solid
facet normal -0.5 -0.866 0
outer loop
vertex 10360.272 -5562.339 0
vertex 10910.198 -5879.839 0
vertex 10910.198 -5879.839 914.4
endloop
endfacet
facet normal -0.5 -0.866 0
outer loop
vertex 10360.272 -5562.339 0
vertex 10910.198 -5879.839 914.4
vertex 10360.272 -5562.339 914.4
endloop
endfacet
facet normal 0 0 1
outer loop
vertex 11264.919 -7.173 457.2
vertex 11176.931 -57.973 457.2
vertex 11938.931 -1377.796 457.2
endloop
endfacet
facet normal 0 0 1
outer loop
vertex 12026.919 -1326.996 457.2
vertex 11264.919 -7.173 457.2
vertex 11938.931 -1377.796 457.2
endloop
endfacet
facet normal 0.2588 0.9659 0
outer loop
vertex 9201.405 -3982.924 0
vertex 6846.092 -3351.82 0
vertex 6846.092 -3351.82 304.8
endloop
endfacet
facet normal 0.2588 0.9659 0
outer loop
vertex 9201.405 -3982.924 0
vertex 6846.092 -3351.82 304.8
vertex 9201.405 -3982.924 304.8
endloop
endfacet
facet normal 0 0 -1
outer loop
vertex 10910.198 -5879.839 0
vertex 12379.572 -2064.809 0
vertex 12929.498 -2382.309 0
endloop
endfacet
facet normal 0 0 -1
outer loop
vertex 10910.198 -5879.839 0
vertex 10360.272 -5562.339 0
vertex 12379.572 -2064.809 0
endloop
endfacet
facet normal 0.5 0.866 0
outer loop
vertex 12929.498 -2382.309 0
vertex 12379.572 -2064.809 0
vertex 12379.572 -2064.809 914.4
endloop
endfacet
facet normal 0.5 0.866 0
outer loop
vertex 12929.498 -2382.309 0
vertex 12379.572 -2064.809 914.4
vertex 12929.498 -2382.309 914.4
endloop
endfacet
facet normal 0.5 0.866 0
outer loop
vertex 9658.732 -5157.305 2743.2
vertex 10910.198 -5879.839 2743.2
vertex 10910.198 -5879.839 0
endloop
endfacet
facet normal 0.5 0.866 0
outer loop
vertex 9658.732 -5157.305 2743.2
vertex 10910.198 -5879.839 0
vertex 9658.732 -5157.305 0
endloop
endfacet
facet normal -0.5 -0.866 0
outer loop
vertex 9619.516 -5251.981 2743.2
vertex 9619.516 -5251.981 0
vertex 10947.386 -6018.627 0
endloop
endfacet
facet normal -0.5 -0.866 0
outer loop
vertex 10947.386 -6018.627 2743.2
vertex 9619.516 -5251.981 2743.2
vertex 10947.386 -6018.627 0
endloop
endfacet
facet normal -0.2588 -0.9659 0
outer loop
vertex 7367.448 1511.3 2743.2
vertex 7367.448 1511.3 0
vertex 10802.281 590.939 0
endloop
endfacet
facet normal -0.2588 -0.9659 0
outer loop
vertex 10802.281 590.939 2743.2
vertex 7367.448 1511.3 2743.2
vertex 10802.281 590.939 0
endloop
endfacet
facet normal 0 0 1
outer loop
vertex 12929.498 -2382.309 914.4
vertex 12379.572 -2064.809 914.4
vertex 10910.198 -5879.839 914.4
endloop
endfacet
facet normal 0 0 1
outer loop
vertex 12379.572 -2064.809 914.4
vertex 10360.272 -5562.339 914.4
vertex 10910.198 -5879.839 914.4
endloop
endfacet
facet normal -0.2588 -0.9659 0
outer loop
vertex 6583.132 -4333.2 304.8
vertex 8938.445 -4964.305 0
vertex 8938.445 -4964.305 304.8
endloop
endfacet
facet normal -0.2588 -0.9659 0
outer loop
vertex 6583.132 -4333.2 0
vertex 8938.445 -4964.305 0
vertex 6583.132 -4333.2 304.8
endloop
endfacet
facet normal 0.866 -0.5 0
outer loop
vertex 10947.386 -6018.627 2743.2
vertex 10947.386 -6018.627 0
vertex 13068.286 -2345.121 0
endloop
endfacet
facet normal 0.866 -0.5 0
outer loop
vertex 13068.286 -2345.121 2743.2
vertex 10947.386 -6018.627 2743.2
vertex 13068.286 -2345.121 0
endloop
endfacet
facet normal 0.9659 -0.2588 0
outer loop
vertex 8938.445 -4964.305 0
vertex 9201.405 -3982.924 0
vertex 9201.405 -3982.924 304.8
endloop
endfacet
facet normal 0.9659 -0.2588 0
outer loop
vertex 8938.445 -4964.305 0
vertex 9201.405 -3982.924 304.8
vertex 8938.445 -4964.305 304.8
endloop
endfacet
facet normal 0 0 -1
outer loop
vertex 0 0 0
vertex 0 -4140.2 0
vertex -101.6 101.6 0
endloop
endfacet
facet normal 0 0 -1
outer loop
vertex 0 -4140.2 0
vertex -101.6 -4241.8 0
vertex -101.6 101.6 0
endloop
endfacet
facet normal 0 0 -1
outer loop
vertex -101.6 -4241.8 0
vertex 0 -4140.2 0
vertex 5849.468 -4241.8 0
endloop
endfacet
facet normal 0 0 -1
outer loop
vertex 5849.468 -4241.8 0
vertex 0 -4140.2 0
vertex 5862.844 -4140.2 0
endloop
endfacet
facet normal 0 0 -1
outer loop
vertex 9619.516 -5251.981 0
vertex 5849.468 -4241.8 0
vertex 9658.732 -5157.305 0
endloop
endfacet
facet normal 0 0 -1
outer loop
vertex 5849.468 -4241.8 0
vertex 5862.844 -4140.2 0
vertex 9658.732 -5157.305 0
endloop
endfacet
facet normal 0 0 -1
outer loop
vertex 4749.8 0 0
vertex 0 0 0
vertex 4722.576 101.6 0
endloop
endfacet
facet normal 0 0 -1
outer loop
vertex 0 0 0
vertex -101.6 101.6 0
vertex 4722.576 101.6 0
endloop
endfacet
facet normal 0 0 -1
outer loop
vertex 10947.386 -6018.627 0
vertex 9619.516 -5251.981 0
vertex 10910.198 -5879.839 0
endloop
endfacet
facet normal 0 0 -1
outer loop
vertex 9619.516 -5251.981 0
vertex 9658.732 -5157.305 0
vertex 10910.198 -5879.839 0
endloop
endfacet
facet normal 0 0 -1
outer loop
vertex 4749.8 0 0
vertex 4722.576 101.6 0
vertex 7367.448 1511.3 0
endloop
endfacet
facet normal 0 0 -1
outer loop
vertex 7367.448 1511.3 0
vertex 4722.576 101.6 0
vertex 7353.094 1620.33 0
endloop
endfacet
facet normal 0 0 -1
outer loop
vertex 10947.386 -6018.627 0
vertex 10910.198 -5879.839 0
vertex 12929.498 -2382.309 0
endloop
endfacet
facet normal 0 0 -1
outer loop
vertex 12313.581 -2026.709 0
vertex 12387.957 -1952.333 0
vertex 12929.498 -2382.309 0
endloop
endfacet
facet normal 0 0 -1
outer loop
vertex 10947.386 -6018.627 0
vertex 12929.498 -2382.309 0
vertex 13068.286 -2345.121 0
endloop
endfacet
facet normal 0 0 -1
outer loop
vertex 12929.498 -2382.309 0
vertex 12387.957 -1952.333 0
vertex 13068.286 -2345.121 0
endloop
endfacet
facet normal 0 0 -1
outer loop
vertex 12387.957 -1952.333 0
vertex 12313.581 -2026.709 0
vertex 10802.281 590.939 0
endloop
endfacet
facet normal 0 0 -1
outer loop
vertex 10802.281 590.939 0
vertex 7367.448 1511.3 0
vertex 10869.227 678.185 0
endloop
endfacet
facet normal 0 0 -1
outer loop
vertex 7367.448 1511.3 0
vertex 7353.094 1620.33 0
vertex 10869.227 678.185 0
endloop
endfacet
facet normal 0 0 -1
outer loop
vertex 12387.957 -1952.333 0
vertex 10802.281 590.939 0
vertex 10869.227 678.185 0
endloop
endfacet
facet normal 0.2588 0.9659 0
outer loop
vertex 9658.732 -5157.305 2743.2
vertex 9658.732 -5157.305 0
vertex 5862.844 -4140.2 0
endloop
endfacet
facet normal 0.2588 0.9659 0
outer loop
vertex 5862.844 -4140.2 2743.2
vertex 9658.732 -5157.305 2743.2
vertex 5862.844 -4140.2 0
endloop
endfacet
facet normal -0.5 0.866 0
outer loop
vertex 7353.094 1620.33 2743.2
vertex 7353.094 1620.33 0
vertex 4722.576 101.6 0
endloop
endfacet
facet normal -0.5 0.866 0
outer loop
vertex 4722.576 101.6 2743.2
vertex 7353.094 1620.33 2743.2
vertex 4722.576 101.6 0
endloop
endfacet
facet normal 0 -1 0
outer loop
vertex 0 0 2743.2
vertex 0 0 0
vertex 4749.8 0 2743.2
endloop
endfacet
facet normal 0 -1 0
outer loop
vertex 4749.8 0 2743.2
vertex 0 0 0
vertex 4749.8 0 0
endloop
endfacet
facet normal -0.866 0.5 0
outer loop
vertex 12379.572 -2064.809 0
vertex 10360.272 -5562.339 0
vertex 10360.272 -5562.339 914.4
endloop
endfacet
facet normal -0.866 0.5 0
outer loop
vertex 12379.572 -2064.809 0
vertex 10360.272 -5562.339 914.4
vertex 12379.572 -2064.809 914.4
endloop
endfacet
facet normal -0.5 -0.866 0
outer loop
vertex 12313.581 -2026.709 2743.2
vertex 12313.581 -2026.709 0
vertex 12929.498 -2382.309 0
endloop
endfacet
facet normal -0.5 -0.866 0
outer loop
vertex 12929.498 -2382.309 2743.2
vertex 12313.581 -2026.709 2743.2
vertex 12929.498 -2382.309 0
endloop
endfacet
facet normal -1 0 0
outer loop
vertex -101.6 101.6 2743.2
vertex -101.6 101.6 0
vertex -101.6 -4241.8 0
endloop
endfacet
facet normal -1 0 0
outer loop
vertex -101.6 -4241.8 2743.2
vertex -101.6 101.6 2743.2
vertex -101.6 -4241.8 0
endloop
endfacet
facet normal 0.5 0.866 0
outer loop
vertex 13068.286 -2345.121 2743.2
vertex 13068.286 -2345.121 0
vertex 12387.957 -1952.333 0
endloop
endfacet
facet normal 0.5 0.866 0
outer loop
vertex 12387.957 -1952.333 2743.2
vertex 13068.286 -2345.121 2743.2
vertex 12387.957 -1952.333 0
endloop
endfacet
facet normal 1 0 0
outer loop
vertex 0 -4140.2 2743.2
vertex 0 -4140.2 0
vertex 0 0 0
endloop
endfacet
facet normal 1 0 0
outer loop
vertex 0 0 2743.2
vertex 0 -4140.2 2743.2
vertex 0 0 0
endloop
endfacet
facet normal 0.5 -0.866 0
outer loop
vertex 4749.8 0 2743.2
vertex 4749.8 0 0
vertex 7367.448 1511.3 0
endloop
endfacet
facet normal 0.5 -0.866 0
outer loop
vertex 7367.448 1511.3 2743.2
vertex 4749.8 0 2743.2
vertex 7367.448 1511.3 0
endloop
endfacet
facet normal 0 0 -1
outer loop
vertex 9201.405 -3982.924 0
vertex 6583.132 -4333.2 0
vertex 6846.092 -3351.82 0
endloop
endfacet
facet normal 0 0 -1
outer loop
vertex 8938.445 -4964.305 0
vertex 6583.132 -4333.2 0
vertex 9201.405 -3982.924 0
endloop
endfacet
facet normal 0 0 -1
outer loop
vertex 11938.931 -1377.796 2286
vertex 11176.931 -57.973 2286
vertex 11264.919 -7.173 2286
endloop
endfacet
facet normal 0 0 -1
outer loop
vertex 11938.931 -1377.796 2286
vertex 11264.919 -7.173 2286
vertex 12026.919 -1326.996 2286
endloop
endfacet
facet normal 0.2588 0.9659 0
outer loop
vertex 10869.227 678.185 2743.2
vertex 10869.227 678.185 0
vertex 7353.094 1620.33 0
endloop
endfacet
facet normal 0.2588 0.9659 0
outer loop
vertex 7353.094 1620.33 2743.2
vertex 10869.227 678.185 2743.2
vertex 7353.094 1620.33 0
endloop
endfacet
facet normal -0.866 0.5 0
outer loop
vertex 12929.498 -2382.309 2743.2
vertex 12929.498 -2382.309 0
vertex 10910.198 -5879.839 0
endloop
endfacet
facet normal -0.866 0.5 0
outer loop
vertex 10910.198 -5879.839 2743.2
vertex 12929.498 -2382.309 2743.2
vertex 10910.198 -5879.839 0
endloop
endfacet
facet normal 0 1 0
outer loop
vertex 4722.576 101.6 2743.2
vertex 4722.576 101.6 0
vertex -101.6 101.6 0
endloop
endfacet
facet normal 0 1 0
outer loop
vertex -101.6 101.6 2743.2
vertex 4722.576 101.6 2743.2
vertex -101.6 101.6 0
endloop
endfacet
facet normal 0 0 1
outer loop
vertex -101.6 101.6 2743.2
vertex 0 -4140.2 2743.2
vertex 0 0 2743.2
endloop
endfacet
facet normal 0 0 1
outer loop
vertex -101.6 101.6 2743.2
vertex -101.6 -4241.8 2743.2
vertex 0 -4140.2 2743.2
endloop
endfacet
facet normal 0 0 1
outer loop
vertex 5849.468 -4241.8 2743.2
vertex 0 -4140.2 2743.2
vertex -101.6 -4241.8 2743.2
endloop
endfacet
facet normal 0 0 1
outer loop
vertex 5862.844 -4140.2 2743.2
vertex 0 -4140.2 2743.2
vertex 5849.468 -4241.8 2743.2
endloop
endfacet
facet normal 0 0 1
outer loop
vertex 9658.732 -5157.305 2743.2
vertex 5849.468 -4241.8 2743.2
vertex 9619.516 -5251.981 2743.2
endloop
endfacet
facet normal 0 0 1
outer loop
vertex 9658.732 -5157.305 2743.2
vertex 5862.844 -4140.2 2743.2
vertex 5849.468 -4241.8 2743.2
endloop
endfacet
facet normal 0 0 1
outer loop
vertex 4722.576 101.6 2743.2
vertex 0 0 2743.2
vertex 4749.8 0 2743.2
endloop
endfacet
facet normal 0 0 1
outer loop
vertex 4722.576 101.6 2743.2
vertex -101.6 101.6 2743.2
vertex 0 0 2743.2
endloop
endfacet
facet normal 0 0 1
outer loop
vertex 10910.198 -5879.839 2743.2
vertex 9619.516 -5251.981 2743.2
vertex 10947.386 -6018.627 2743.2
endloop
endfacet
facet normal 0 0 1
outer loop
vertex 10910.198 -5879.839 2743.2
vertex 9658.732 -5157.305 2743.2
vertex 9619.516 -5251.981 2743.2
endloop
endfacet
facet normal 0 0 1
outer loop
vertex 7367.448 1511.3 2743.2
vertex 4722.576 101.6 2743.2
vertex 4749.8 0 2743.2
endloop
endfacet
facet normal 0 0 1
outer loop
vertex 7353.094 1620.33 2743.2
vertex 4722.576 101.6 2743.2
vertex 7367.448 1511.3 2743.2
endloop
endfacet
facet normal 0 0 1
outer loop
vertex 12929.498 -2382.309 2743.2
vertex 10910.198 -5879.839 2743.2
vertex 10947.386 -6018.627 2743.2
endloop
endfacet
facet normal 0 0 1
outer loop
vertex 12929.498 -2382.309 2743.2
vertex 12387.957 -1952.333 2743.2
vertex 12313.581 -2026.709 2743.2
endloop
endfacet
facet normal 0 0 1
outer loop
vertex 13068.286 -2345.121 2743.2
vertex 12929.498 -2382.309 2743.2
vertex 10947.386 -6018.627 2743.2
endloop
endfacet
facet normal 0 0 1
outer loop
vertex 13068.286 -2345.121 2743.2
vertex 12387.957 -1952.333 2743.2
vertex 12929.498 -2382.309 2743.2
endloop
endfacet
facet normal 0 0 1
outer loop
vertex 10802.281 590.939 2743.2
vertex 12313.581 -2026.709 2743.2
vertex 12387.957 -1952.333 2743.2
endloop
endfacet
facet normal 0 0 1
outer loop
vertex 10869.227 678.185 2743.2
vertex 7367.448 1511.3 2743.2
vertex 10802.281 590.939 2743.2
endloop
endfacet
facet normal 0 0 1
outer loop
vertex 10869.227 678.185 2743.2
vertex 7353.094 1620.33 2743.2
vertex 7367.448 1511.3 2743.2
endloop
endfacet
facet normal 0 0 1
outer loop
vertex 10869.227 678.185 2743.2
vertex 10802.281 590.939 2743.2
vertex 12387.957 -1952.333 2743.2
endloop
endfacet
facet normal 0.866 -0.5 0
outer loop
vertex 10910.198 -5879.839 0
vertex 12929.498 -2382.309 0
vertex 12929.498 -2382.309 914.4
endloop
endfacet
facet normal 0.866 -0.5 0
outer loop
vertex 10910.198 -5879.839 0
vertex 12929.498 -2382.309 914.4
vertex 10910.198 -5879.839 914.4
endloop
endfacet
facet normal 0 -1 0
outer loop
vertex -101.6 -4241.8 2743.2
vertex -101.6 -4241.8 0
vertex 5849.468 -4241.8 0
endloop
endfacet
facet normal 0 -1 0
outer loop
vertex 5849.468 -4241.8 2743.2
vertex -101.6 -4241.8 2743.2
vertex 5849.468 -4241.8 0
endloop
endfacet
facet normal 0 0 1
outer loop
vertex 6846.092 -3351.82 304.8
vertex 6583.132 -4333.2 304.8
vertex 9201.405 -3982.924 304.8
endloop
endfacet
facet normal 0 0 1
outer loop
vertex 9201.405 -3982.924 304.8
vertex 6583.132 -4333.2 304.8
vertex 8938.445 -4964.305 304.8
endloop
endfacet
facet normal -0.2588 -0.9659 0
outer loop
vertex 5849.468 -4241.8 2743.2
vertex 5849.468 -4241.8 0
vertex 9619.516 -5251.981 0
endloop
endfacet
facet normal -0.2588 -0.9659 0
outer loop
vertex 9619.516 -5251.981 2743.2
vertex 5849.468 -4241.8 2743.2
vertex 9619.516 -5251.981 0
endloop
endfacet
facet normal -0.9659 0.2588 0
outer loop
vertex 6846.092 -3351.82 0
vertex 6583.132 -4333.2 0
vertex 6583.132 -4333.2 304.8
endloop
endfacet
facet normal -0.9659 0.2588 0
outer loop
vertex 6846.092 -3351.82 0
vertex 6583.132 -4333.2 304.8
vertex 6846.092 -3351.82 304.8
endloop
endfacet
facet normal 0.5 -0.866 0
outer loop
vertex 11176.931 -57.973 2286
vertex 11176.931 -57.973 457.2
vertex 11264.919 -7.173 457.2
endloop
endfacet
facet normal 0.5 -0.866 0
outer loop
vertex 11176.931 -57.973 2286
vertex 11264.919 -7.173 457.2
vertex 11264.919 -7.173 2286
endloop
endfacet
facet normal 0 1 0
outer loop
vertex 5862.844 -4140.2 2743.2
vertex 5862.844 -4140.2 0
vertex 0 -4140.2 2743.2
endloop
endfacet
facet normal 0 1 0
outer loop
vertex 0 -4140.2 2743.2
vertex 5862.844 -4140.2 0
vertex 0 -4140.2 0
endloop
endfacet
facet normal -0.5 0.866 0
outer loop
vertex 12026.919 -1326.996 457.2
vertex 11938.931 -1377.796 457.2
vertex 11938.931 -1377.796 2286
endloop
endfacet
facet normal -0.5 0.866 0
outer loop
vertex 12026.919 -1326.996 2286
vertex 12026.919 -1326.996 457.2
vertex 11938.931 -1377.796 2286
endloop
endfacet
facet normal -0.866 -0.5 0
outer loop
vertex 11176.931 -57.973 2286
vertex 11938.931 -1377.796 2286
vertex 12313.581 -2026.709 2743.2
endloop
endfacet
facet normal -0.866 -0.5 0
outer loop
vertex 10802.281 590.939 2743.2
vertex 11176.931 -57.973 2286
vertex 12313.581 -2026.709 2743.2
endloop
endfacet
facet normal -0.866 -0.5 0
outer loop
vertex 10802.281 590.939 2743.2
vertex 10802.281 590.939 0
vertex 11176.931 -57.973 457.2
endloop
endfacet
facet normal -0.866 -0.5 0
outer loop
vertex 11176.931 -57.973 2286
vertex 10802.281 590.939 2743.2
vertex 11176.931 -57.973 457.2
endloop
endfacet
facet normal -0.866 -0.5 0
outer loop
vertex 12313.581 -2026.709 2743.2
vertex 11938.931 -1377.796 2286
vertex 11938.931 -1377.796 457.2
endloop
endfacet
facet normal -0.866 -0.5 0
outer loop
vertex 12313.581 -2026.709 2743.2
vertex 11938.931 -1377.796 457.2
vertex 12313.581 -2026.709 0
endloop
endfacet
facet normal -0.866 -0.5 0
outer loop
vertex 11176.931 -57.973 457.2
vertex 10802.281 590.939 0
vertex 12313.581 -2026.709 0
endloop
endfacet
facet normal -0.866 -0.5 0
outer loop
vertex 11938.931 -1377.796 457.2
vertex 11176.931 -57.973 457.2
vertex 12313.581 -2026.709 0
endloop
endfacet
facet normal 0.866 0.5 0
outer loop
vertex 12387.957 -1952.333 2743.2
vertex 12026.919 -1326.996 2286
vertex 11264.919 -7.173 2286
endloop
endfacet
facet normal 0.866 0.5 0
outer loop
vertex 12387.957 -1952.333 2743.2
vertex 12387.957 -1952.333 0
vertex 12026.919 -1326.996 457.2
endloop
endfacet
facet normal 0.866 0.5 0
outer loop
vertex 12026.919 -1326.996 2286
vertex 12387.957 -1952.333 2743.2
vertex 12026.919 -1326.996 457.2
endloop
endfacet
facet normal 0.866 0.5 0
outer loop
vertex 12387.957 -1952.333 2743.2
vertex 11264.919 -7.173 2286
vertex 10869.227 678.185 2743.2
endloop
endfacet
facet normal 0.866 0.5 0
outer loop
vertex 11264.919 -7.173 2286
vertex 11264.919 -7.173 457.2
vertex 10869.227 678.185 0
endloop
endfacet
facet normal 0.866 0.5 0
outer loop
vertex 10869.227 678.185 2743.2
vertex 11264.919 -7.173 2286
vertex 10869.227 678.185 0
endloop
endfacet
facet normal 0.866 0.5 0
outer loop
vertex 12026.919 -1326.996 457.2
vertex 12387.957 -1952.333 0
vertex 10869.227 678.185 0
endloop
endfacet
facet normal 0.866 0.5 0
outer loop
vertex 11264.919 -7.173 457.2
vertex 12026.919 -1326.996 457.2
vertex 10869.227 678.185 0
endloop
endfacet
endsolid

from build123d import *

# Parameters (mm, degrees)
F1_DEPTH = 2743.2
F3_DEPTH = 914.4
F4_W     = 1524
F4_H     = 1828.8
F5_DEPTH = 2477.1146604405
F7_DEPTH = 304.8


with BuildPart() as f1:
    # F0 (on Top) → F1 (new body)
    with BuildSketch(Plane.XY):
        Polygon((13068.2860719588, -2345.1207288389), (12387.9569858118, -1952.3325478144), (10869.2267558187, 678.1853735243), (7353.0942833877, 1620.3302299931), (4722.576362049, 101.6), (-101.6, 101.6), (-101.6, -4241.8), (5849.4684062853, -4241.8), (7544.9041272329, -4696.0906322468), (9619.5162102296, -5251.9812644936), (10947.3860719588, -6018.6272866117), align=None)
        Polygon((0, -4140.2), (0, 0), (4749.8, 0), (7367.4483854788, 1511.3), (10802.2806237628, 590.9394756154), (12313.5806237628, -2026.7089098634), (12929.4978909343, -2382.3089098634), (10910.1978909343, -5879.8391055872), (9658.7323464395, -5157.3051365917), (7571.2001422153, -4597.9525682958), (5862.8443000402, -4140.2), align=None, mode=Mode.SUBTRACT)
    extrude(amount=F1_DEPTH)

    # F4 (on face) → F5 (cut, through all)
    with BuildSketch(Plane(origin=(8357.5947668131, 4825.2595883973, 0), x_dir=(0.5, -0.8660254038, 0), z_dir=(-0.8660254038, -0.5, 0))):
        with Locations((6400.6717138994, 1371.6)):
            Rectangle(F4_W, F4_H)
    extrude(amount=-F5_DEPTH, mode=Mode.SUBTRACT)


with BuildPart() as f3:
    # F2 (on face) → F3 (new body)
    with BuildSketch(Plane(origin=(0, 0, 0), x_dir=(1, 0, 0), z_dir=(0, 0, -1))):
        Polygon((12379.5717595311, 2064.8089098634), (12929.4978909343, 2382.3089098634), (10910.1978909343, 5879.8391055872), (10360.2717595311, 5562.3391055872), align=None)
    extrude(amount=-F3_DEPTH)


with BuildPart() as f7:
    # F6 (on face) → F7 (new body)
    with BuildSketch(Plane(origin=(0, 0, 0), x_dir=(1, 0, 0), z_dir=(0, 0, -1))):
        Polygon((6583.1315558282, 4333.2003885068), (6846.0917056524, 3351.8197489971), (9201.4052404756, 3982.9241085751), (8938.4450906515, 4964.3047480848), align=None)
    extrude(amount=-F7_DEPTH)


solid = Compound([f1.part, f3.part, f7.part])
